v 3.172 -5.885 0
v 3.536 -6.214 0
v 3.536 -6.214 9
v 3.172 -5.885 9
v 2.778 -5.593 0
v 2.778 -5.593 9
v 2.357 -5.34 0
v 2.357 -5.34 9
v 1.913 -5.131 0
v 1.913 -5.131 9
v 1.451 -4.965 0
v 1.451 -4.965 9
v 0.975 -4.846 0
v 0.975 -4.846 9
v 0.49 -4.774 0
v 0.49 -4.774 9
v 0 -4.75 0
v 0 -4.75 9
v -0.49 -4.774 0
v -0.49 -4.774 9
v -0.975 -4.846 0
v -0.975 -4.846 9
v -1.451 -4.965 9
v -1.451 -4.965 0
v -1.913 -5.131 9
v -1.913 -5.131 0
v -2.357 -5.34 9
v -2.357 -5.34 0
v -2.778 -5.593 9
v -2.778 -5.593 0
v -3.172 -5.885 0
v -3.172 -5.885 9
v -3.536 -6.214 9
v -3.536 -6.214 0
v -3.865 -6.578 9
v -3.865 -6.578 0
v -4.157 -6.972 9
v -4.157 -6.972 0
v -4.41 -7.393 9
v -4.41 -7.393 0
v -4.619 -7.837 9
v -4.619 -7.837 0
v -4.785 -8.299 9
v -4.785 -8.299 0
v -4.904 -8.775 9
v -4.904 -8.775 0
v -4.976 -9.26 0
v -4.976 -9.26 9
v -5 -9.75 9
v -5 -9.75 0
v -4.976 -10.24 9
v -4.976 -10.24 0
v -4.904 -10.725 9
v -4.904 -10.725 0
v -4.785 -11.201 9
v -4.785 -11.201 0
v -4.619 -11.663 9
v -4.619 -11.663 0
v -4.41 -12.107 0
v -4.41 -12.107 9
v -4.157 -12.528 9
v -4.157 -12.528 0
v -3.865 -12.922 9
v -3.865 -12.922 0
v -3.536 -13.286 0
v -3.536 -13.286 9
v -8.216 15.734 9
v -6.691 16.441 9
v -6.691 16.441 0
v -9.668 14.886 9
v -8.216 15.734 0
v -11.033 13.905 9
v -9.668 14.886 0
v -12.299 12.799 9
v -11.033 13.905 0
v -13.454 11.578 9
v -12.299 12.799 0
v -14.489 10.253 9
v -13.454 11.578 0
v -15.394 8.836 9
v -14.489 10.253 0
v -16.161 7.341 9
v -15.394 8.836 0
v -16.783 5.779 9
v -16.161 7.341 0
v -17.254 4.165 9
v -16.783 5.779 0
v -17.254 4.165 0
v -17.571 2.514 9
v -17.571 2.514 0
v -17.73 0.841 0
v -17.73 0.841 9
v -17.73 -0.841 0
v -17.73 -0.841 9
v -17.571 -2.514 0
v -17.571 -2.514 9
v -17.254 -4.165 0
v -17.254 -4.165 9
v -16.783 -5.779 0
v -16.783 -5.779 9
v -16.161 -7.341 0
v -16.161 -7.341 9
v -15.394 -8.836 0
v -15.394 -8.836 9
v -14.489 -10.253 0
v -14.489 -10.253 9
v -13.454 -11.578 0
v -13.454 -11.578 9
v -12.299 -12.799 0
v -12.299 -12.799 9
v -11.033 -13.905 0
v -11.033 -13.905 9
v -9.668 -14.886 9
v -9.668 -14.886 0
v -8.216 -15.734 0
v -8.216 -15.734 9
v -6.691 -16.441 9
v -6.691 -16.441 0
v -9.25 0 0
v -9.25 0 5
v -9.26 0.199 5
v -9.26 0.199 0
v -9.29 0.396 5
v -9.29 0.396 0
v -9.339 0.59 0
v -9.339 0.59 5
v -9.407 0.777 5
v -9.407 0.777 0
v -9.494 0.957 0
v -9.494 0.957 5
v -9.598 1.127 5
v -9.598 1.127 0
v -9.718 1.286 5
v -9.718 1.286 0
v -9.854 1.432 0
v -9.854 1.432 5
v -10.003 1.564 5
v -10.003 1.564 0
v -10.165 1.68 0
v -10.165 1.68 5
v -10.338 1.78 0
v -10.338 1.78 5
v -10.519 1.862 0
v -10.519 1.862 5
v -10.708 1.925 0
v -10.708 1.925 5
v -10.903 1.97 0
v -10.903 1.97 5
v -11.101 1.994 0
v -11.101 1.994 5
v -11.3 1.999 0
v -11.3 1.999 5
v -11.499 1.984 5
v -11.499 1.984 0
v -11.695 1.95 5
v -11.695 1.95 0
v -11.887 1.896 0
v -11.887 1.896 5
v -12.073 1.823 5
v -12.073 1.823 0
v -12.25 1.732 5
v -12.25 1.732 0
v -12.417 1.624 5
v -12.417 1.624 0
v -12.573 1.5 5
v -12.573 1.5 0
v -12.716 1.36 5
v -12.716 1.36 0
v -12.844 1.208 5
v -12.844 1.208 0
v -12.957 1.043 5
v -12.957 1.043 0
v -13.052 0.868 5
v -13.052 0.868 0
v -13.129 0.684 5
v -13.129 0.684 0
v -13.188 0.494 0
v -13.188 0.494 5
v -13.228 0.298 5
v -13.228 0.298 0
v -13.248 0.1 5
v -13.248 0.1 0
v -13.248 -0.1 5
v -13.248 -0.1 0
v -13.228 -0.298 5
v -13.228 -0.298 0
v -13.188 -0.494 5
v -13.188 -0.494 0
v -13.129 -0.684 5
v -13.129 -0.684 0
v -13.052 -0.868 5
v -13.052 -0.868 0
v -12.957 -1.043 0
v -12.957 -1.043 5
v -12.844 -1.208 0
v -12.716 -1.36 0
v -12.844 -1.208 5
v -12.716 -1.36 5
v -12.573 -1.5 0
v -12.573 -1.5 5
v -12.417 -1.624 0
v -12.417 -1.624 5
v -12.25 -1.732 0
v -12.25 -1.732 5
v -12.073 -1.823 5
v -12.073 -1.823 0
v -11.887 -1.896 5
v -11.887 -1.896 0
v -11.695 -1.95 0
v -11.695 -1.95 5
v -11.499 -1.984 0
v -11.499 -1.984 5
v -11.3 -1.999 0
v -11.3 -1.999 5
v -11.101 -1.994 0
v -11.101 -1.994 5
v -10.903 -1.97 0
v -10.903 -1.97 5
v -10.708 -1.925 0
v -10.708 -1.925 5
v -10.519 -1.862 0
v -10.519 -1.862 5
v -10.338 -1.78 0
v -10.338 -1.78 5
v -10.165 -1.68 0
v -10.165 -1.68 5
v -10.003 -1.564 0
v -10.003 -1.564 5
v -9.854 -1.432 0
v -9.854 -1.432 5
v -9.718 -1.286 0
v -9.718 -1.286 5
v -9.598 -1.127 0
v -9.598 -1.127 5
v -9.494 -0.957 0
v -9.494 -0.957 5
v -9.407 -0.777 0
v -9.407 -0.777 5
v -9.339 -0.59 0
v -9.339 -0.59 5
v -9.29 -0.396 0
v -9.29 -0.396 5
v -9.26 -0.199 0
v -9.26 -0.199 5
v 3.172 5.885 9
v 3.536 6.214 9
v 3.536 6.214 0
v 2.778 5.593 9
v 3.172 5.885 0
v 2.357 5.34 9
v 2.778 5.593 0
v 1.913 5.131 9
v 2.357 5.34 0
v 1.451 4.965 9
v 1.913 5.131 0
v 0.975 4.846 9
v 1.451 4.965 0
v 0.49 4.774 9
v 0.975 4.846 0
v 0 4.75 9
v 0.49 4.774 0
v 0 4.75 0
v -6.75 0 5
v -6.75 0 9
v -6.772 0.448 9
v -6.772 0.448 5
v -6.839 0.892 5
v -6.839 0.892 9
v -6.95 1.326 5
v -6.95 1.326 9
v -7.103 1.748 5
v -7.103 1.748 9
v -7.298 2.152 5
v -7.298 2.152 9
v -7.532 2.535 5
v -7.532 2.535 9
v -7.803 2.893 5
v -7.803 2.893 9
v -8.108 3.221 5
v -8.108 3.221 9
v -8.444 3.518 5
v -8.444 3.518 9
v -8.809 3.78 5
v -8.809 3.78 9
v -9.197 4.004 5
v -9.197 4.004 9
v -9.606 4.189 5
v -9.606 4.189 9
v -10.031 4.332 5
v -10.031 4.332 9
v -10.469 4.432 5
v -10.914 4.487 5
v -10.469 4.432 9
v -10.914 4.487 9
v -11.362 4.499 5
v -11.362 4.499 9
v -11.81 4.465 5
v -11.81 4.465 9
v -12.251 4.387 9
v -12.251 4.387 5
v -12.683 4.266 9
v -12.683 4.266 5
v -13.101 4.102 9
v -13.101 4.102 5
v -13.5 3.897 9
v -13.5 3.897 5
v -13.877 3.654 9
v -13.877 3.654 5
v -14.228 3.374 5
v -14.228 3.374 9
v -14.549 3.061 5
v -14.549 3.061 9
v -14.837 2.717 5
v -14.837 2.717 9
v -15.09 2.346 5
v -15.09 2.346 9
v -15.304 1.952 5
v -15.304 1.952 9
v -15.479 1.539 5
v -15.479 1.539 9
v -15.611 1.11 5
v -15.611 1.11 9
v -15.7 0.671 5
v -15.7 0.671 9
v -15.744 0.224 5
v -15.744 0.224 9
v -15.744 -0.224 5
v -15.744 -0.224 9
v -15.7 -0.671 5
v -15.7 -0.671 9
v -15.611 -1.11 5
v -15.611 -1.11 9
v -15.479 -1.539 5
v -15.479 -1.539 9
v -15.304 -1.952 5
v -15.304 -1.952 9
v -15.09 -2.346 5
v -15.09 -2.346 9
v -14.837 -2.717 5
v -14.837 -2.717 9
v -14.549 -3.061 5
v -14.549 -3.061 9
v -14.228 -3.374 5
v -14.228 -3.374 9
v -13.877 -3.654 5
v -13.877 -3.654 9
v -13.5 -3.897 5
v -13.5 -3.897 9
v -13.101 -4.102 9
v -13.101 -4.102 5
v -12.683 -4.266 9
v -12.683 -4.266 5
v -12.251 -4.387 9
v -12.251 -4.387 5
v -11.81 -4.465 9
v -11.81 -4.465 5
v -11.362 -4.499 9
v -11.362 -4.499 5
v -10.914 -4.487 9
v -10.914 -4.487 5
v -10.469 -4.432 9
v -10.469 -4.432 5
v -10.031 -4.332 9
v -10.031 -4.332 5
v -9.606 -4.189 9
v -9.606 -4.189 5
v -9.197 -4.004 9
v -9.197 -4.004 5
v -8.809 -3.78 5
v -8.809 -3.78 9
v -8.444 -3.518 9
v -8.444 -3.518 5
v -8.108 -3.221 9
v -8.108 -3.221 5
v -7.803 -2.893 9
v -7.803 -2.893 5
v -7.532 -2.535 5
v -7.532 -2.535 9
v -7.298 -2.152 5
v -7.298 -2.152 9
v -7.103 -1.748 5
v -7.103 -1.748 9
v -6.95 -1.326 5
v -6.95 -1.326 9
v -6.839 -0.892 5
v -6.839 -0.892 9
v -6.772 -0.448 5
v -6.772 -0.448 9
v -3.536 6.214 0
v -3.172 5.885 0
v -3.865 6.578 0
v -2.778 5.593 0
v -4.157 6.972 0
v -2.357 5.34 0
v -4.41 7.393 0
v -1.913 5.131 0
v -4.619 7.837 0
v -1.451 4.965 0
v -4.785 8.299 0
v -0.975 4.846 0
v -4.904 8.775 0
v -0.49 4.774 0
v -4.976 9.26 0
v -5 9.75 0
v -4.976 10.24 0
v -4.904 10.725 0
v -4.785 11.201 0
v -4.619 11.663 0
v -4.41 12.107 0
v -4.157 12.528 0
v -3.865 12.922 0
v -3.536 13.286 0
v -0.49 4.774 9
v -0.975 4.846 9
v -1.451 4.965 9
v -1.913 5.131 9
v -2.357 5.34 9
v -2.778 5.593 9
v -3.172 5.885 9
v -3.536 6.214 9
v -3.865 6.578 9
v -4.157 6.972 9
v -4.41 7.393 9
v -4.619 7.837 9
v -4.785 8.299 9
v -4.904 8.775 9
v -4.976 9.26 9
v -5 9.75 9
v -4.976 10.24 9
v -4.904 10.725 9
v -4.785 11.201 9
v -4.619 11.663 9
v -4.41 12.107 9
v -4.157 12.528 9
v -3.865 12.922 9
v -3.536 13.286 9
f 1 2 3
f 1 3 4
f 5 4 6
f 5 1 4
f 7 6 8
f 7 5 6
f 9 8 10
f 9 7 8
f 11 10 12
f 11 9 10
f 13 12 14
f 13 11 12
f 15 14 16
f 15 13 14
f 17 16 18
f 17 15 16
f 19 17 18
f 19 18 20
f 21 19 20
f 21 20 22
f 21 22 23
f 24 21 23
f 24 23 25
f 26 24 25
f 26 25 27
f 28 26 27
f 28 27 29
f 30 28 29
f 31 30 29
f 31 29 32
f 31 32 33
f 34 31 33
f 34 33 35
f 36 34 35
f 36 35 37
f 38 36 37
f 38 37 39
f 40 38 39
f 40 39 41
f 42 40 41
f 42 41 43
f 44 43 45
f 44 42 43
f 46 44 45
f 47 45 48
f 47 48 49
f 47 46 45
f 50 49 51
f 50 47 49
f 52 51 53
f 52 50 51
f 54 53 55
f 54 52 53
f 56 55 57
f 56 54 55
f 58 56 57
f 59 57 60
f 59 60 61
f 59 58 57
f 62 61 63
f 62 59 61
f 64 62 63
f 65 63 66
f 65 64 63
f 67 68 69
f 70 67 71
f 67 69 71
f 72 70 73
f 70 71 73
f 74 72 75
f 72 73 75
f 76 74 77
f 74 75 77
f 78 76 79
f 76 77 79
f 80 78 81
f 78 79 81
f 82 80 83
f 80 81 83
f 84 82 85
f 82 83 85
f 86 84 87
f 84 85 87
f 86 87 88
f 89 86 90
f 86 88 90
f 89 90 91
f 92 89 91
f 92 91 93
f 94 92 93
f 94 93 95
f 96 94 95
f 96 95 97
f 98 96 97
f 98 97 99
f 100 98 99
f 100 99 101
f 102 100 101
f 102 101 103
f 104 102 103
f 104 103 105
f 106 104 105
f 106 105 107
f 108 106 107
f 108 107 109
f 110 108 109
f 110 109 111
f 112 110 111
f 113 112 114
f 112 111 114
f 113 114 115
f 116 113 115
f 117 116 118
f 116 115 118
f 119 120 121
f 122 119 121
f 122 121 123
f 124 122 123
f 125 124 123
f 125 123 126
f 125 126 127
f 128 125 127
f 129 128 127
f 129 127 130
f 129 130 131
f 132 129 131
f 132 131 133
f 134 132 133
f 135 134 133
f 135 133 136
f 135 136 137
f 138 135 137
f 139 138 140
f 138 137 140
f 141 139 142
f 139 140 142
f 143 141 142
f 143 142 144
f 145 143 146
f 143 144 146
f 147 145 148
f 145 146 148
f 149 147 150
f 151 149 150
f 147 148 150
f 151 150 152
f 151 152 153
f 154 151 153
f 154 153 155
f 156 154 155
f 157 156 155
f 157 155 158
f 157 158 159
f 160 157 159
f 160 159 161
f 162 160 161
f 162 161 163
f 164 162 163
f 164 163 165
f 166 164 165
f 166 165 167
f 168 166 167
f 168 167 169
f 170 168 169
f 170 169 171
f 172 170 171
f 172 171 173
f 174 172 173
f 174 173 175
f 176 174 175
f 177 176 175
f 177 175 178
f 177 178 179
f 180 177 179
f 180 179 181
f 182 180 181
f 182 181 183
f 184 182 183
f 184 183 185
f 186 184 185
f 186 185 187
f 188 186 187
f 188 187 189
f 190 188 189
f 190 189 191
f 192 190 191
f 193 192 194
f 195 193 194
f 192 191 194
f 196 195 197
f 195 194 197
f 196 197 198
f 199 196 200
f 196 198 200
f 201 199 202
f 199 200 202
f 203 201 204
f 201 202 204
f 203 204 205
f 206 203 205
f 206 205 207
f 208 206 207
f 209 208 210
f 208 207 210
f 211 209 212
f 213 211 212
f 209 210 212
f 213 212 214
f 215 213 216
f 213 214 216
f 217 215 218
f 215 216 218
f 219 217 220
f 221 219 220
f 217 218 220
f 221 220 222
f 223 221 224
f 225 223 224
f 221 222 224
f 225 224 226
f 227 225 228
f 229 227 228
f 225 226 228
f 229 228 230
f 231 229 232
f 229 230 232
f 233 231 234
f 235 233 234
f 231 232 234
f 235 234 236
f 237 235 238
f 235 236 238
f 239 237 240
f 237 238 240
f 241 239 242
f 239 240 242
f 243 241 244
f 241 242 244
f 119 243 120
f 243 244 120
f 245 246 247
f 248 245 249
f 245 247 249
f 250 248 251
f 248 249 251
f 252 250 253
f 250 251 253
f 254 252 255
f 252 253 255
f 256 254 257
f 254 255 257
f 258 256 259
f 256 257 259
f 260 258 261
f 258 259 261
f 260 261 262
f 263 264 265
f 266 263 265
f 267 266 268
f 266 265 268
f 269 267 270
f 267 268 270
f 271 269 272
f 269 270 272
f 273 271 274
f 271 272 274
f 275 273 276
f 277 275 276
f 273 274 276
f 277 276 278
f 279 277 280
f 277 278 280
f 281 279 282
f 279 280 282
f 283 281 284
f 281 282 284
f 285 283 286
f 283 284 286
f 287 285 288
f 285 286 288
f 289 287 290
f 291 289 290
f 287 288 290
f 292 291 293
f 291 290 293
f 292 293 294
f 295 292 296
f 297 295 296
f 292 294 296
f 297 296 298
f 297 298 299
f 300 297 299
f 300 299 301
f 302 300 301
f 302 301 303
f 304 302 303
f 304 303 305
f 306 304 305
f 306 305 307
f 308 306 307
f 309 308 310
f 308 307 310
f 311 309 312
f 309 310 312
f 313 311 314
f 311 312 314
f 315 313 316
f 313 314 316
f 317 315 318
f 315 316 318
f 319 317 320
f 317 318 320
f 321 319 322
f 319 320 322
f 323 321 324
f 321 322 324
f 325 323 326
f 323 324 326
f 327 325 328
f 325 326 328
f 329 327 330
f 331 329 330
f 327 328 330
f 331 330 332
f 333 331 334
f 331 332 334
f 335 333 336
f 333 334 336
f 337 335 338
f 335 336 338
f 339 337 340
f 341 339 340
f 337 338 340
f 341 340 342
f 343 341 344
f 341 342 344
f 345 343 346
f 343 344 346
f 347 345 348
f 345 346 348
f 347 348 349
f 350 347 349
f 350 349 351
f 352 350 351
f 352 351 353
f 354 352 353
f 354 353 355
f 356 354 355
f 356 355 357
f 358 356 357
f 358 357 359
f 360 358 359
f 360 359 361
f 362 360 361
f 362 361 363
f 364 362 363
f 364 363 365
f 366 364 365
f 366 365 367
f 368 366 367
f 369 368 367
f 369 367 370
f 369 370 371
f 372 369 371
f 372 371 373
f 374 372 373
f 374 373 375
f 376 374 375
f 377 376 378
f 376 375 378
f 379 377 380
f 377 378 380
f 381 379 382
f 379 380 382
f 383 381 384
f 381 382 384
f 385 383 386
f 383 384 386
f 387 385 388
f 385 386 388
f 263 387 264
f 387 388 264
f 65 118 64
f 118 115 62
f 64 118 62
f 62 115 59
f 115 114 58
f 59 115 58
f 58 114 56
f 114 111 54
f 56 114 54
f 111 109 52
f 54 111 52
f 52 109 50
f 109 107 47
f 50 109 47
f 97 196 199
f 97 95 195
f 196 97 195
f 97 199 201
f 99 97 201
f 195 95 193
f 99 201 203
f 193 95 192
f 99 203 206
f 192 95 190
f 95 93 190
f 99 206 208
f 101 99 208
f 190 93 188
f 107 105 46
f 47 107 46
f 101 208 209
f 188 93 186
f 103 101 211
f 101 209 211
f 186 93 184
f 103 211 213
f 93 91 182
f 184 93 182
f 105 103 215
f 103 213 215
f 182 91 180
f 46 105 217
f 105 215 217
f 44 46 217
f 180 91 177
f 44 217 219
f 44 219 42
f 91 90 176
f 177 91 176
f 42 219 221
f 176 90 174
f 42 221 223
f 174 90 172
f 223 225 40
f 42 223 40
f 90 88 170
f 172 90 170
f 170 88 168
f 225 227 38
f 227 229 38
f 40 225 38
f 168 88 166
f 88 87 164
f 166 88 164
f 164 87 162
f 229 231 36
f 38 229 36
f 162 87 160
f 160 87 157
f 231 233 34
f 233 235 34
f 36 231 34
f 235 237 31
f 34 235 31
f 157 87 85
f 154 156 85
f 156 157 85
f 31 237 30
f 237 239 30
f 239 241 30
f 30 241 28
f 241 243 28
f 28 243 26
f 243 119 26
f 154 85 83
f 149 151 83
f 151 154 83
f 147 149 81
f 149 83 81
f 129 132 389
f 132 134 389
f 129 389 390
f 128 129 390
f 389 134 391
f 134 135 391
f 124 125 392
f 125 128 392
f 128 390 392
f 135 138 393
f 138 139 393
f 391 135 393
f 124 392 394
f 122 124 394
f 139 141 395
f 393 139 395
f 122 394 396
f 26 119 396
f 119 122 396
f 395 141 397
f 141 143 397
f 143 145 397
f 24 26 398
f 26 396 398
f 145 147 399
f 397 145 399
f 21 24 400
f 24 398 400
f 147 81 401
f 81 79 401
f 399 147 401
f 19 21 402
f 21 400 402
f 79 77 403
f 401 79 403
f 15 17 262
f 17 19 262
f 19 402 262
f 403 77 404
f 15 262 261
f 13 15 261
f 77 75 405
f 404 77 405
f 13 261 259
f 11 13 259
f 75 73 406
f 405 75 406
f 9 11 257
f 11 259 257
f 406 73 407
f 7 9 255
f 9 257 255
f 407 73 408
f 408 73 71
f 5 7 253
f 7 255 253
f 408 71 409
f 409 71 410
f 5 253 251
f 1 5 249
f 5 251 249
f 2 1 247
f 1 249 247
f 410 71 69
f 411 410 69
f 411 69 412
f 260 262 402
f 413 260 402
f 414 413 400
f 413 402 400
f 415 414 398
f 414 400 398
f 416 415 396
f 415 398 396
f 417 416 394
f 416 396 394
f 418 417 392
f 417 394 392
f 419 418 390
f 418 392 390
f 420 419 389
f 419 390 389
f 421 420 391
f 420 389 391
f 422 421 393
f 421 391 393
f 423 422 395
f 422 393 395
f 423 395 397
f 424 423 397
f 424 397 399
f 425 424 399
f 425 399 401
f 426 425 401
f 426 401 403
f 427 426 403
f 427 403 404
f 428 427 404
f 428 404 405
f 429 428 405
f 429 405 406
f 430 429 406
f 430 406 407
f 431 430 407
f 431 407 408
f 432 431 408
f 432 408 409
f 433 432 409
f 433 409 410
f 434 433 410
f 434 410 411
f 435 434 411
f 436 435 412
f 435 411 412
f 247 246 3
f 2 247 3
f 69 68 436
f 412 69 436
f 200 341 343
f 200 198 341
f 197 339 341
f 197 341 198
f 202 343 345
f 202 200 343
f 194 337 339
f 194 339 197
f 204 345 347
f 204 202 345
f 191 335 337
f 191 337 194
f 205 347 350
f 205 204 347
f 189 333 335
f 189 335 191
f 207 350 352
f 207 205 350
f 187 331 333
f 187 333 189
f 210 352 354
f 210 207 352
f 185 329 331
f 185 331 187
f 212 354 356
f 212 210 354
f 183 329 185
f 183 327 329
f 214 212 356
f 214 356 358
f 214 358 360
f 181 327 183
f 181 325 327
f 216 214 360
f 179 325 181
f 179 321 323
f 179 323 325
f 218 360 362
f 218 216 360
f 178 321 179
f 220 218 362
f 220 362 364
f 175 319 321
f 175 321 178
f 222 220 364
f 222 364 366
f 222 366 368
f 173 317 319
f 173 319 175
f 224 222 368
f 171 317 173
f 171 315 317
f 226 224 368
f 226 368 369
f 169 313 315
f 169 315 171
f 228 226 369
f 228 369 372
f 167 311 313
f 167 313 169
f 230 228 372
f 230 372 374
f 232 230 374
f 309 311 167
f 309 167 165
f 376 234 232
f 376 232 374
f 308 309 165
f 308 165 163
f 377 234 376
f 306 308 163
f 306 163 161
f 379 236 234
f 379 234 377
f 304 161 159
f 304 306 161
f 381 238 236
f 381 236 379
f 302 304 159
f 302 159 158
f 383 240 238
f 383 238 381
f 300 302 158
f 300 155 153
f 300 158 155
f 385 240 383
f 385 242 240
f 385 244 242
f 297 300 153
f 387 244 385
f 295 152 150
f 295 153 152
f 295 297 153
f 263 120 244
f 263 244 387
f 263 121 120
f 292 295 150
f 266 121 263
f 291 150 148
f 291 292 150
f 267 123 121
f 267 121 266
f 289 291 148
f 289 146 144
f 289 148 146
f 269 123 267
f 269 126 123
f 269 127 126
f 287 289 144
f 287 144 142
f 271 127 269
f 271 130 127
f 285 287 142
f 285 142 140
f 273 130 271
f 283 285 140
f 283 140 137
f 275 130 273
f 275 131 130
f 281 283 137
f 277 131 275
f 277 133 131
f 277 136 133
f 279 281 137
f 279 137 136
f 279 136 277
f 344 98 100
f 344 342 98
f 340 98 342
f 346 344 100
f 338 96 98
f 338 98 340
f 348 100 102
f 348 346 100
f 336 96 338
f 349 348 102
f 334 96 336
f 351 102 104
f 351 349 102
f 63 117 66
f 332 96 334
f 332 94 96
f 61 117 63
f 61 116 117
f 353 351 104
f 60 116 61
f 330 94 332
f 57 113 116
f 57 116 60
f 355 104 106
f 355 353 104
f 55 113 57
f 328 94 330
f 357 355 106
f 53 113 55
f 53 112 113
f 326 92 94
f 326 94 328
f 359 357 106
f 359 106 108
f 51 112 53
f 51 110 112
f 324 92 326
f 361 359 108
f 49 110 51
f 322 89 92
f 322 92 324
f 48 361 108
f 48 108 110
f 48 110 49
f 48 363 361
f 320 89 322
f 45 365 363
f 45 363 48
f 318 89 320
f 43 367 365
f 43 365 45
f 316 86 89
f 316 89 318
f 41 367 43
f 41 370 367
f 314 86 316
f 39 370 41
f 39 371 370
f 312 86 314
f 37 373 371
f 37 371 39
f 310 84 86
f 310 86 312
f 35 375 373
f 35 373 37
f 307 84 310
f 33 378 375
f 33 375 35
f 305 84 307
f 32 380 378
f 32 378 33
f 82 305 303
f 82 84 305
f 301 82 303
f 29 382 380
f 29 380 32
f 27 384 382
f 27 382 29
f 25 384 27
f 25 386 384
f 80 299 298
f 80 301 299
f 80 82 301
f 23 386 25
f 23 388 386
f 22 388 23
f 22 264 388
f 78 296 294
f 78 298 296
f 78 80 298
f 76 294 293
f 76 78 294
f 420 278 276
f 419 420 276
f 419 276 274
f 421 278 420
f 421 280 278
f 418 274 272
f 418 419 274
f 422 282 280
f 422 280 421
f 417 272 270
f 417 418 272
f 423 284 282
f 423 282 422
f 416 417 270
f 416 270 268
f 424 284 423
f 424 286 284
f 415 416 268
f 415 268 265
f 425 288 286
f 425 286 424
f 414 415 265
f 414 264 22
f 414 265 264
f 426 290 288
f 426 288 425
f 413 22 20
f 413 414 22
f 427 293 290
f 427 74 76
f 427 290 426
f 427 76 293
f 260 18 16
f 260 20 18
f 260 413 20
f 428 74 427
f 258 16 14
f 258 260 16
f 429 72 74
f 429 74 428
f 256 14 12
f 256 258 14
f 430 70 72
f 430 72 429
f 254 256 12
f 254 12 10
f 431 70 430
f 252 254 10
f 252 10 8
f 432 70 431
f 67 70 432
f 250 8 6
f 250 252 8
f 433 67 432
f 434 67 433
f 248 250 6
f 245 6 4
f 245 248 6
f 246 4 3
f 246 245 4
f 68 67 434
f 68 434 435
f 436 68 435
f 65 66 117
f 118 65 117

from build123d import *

# Parameters (mm, degrees)
F1_R      = 17.75
F1_R_2    = 5
F2_DEPTH  = 9
F3_R      = 2
F4_DEPTH  = 25
F5_R      = 4.5
F6_DEPTH  = 4
F7_R      = 4.9962350467
F8_DEPTH  = 9
F10_DEPTH = 25
F12_DEPTH = 25


with BuildPart() as f2:
    # F1 (on Top) → F2 (new body)
    with BuildSketch(Plane.XY):
        Circle(F1_R)
        with Locations((0, -9.75)):
            Circle(F1_R_2, mode=Mode.SUBTRACT)
        with BuildLine():
            ThreePointArc((0, 4.75), (-3.5355339059, 13.2855339059), (5, 9.75))
            ThreePointArc((5, 9.75), (3.5355339059, 6.2144660941), (0, 4.75))
        make_face(mode=Mode.SUBTRACT)
    extrude(amount=F2_DEPTH)

    # F3 (on face) → F4 (cut)
    with BuildSketch(Plane.XY.offset(9)):
        with BuildLine():
            ThreePointArc((9.25, 0), (11.25, -2), (13.25, 0))
            ThreePointArc((13.25, 0), (11.25, 2), (9.25, 0))
        make_face()
        with Locations((-11.25, 0)):
            Circle(F3_R)
    extrude(amount=-F4_DEPTH, mode=Mode.SUBTRACT)

    # F5 (on face) → F6 (cut)
    with BuildSketch(Plane.XY.offset(9)):
        with Locations((11.25, 0)):
            Circle(F5_R)
        with Locations((-11.25, 0)):
            Circle(F5_R)
    extrude(amount=-F6_DEPTH, mode=Mode.SUBTRACT)

    # F7 (on face) → F8 (join)
    with BuildSketch(Plane.XY.offset(9)):
        with Locations((11.25, 0)):
            Circle(F7_R)
    extrude(amount=-F8_DEPTH)

    # F9 (on face) → F10 (cut)
    with BuildSketch(Plane.XY.offset(9)):
        with BuildLine():
            ThreePointArc((8.35, 0), (9.5, -1.15), (10.65, 0))
            ThreePointArc((10.65, 0), (9.5, 1.15), (8.35, 0))
        make_face()
    extrude(amount=-F10_DEPTH, mode=Mode.SUBTRACT)

    # F11 (on face) → F12 (cut)
    with BuildSketch(Plane.XY.offset(9)):
        with BuildLine():
            Line((-7.4342581112, 17.1842581112), (0, 9.75))
            Line((0, 9.75), (3.5355339059, 6.2144660941))
            Line((3.5355339059, 6.2144660941), (3.5355339059, -6.2144660941))
            Line((3.5355339059, -6.2144660941), (0, -9.75))
            Line((0, -9.75), (-7.4342581112, -17.1842581112))
            ThreePointArc((-7.4342581112, -17.1842581112), (18.7234323909, 0), (-7.4342581112, 17.1842581112))
        make_face()
    extrude(amount=-F12_DEPTH, mode=Mode.SUBTRACT)


solid = f2.part
